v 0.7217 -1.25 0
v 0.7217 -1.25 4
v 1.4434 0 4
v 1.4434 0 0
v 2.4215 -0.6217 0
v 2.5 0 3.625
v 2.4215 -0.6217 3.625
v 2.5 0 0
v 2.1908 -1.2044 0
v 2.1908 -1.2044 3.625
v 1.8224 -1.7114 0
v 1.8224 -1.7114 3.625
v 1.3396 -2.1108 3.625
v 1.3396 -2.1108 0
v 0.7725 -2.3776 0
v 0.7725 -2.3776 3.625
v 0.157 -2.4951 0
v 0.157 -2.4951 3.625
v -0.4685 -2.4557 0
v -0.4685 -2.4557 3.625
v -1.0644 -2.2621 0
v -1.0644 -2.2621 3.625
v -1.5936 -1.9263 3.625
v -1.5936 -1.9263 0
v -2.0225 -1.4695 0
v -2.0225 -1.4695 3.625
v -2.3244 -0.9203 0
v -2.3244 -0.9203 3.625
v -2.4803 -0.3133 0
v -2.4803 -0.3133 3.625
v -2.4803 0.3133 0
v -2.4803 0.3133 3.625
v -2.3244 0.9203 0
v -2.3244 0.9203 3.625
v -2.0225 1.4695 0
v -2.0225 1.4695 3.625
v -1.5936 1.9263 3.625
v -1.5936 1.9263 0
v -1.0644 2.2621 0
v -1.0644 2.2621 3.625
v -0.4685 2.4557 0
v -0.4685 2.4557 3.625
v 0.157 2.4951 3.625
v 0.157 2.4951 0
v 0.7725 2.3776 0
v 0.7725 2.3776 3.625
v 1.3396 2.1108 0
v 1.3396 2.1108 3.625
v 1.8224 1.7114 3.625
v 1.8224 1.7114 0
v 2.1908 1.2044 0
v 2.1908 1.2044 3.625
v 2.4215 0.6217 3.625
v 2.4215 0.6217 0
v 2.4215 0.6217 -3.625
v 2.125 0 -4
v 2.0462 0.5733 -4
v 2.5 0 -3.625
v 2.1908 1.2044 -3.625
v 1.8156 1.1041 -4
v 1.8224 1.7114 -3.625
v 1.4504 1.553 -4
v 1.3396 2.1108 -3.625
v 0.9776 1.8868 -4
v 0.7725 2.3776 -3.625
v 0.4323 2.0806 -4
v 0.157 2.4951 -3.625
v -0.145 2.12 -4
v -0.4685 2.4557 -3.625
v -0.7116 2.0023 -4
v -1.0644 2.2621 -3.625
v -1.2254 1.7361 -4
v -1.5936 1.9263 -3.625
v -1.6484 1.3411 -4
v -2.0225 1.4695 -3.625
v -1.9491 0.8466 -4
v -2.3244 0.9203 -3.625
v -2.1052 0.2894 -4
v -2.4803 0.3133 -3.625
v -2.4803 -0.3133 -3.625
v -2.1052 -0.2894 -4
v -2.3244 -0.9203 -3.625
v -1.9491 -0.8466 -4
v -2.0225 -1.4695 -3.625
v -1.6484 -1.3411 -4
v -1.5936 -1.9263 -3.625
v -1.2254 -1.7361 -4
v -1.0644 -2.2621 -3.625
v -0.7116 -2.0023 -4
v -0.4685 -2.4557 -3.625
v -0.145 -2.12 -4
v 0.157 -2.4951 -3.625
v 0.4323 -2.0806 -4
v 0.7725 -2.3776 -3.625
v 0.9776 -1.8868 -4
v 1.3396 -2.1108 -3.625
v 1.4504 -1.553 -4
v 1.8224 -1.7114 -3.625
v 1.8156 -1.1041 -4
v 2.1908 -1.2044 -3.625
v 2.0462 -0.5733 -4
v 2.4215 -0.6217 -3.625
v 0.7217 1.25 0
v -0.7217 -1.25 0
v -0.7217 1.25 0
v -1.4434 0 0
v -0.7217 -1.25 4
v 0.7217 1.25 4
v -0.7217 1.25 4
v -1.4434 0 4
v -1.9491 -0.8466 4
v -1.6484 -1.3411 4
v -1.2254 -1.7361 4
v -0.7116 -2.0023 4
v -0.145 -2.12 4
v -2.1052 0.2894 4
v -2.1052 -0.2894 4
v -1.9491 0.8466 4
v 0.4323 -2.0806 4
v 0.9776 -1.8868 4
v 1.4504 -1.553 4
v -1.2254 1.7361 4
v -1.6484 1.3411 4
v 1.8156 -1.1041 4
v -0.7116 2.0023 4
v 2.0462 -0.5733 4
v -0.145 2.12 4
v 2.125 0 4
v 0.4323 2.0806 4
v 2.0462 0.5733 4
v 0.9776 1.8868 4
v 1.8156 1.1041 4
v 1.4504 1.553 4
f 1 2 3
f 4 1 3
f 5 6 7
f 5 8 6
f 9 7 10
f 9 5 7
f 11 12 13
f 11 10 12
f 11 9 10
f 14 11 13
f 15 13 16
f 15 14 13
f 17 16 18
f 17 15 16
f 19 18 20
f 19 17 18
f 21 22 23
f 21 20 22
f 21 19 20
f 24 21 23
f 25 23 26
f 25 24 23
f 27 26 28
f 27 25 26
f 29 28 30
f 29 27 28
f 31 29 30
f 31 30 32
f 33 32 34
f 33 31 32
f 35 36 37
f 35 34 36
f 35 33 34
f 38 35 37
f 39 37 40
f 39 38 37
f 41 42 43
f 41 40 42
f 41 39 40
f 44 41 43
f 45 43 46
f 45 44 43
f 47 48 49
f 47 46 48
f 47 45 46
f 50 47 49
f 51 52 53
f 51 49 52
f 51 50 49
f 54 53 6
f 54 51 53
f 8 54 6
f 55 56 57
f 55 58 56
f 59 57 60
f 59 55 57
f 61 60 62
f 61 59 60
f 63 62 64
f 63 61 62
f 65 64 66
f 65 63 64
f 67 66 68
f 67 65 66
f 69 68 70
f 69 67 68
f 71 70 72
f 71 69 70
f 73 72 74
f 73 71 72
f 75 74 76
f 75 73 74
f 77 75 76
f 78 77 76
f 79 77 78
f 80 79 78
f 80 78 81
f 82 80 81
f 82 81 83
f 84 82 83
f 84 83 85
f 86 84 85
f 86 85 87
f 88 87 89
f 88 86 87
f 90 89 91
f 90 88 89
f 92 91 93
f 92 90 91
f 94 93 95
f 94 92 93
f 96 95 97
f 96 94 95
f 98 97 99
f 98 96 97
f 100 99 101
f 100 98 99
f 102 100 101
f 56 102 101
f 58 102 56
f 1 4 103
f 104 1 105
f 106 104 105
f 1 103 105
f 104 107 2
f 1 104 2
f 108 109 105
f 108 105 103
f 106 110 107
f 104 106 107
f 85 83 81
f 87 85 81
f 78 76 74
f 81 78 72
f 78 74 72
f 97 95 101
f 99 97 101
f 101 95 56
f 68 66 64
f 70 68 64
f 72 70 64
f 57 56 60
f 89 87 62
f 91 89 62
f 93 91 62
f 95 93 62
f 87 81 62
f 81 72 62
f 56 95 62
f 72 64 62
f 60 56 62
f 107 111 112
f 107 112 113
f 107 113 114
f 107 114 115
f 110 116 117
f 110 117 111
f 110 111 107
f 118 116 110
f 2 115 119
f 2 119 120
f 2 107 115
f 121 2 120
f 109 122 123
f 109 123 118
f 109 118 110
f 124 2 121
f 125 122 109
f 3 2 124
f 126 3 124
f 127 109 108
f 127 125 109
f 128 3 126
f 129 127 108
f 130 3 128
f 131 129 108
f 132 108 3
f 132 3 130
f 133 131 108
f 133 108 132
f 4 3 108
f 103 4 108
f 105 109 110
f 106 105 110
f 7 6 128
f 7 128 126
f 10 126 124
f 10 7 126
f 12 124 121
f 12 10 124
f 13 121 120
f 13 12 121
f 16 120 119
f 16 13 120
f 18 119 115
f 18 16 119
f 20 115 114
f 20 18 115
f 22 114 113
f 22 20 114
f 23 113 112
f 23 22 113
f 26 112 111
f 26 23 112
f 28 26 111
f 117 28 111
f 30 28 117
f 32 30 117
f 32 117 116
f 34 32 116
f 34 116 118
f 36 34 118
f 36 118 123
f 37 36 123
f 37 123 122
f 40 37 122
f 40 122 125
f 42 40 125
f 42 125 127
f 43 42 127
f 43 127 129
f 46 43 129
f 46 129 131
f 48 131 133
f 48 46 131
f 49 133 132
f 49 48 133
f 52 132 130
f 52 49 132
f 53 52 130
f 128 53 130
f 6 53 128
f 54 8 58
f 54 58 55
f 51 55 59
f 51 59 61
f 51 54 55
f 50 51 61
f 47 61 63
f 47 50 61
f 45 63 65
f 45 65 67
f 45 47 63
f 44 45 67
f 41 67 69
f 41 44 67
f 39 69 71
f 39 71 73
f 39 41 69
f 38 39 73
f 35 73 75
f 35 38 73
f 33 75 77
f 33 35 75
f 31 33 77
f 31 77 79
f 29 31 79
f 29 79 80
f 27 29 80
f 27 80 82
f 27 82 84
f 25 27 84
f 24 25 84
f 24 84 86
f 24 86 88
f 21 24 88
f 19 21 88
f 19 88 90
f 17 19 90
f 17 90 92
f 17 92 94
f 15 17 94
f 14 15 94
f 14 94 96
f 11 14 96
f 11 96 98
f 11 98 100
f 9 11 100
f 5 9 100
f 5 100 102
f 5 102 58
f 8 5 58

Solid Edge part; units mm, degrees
sketch "Sketch1" plane through (0, 0, 0) normal (0, 0, 1) x (1, 0, 0)
  circle A0 centre (0, 0) radius 2.5
  dimension "D1" = 5
extrude "Protrusion1" add sketch "Sketch1" along normal mid plane 8
chamfer "Chamfer1" distance 0.375 angle 45 2 edges at (-2.5, 0, -4) (-2.5, 0, 4)
sketch "Sketch2" plane through (0, 0, 4) normal (0, 0, 1) x (1, 0, 0)
  line L0 (-0.7217, 1.25) -> (0.7217, 1.25)
  line L1 (1.4434, 0) -> (0.7217, 1.25)
  line L2 (0.7217, -1.25) -> (1.4434, 0)
  line L3 (-0.7217, -1.25) -> (0.7217, -1.25)
  line L4 (-1.4434, 0) -> (-0.7217, -1.25)
  line L5 (-0.7217, 1.25) -> (-1.4434, 0)
  dimension "D1" = 2.5
extrude "Cutout1" cut sketch "Sketch2" against normal blind 4
properties part number "24105901"
